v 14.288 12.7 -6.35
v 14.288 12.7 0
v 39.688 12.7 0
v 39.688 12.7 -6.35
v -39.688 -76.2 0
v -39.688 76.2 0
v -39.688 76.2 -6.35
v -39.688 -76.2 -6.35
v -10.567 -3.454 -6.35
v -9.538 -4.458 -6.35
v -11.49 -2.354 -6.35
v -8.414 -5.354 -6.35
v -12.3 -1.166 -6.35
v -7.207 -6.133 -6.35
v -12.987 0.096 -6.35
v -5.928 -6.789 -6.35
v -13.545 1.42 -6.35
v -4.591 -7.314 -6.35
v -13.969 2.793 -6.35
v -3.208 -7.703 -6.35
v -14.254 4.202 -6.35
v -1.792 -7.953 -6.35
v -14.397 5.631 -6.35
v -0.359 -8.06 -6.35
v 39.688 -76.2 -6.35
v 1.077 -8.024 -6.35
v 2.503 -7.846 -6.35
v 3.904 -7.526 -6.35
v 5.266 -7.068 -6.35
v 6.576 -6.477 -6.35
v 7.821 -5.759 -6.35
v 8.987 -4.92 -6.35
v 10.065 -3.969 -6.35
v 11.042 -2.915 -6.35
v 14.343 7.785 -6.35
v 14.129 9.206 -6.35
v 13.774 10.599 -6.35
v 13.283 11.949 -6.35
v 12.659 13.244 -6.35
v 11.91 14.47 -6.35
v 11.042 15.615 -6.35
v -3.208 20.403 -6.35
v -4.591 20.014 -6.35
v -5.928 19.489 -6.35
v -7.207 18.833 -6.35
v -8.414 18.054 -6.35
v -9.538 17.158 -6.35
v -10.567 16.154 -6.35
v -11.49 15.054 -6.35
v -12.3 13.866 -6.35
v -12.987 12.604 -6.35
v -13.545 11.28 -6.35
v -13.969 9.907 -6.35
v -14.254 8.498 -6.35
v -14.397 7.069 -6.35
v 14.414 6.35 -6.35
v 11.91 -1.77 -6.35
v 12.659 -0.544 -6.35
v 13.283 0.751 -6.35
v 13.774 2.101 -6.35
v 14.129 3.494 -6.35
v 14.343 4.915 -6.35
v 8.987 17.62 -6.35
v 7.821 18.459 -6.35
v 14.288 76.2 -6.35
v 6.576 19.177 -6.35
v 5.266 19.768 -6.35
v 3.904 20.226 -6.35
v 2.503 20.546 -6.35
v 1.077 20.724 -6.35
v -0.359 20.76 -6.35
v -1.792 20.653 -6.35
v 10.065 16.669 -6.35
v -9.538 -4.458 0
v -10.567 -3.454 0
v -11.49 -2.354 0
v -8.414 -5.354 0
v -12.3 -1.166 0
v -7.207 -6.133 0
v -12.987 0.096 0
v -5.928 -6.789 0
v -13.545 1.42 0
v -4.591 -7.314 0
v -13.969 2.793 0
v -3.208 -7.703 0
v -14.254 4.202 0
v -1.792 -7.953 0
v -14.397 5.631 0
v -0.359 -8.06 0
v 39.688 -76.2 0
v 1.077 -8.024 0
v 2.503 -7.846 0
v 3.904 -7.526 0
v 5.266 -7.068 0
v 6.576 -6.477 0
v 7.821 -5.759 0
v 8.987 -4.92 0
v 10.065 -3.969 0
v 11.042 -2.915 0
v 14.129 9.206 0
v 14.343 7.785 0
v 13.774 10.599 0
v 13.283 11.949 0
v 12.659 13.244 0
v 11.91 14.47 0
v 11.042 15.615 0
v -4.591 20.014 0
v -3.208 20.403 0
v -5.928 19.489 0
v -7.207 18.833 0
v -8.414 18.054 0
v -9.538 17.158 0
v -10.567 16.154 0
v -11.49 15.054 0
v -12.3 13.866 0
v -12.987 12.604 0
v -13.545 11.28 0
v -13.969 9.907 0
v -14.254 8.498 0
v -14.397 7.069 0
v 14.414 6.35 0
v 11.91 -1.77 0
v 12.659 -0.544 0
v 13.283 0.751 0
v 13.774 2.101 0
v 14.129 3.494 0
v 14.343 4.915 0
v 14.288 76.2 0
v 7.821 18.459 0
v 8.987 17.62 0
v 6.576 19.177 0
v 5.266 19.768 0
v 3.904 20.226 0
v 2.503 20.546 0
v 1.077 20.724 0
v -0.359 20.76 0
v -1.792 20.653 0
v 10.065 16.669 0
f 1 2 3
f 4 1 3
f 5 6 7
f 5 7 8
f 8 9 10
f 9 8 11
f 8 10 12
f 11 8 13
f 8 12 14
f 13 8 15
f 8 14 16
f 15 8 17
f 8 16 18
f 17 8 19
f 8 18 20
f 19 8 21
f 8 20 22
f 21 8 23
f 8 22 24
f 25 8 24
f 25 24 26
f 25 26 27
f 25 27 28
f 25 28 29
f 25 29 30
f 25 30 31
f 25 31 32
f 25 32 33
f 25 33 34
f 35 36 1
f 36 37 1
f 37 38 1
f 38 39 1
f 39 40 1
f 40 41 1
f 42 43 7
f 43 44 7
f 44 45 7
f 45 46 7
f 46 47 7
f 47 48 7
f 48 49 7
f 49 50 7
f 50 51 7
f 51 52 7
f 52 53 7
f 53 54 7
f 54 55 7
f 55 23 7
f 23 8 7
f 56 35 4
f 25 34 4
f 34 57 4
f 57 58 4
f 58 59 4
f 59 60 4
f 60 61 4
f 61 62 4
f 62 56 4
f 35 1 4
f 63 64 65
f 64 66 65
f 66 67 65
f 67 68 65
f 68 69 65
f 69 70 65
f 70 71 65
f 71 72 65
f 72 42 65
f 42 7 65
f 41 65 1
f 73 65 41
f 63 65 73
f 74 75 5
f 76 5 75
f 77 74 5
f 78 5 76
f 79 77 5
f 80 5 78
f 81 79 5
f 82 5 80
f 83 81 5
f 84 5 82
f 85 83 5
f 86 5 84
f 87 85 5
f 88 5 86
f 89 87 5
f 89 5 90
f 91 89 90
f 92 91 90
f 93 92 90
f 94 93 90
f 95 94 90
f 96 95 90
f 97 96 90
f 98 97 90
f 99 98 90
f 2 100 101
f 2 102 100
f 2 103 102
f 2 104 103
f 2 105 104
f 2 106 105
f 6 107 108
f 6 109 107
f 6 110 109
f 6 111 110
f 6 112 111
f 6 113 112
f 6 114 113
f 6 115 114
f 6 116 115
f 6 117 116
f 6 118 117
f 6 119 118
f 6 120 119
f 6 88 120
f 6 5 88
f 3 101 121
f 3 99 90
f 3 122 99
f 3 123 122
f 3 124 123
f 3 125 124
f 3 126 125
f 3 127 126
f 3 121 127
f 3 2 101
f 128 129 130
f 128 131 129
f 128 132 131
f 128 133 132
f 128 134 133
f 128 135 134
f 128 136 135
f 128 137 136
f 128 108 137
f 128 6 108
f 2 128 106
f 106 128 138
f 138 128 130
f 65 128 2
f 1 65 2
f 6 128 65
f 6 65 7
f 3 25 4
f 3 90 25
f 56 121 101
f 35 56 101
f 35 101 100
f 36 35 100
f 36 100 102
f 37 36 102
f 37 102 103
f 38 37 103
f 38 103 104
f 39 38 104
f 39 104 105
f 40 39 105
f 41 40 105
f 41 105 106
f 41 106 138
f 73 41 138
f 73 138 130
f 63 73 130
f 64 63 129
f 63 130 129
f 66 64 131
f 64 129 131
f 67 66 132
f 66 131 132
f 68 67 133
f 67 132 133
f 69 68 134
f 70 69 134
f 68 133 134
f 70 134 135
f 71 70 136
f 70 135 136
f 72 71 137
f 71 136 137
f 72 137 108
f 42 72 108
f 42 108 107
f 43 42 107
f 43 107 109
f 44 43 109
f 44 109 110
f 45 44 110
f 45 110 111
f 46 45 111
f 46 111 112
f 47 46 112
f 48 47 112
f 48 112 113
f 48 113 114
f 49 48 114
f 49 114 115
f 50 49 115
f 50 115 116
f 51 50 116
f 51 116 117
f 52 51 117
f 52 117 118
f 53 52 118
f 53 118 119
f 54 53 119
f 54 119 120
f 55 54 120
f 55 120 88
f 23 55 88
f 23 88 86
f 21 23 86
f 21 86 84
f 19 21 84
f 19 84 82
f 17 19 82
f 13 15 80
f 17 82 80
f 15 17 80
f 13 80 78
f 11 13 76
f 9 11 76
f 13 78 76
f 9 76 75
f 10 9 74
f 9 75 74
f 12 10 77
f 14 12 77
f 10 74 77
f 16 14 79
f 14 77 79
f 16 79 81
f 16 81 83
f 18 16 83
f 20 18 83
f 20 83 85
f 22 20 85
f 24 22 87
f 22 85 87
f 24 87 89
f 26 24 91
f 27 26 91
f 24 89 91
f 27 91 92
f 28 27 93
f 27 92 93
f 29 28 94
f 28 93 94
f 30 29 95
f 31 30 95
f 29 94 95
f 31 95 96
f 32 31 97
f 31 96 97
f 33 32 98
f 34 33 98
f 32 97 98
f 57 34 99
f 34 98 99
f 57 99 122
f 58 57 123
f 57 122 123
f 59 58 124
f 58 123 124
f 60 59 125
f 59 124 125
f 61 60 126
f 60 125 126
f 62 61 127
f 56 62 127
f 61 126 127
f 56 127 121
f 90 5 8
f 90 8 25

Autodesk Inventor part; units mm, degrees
ref_plane "YZ Plane" through (0, 0, 0) normal (1, 0, 0) x (0, 1, 0)
ref_plane "XZ Plane" through (0, 0, 0) normal (0, 1, 0) x (-1, 0, 0)
ref_plane "XY Plane" through (0, 0, 0) normal (0, 0, 1) x (1, 0, 0)
sketch "Sketch1" plane through (0, 0, 0) normal (0, 0, 1) x (1, 0, 0)
  line L0 (-39.6875, -76.2) -> (39.6875, -76.2)
  line L1 (39.6875, -76.2) -> (39.6875, 76.2)
  line L2 (39.6875, 76.2) -> (-39.6875, 76.2)
  line L3 (-39.6875, 76.2) -> (-39.6875, -76.2)
  line L4 (-39.6875, -76.2) -> (39.6875, 76.2) construction
  line L5 (39.6875, -76.2) -> (-39.6875, 76.2) construction
  point P0 (0, 0)
  dimension "d0" = 79.375
  dimension "d1" = 152.4
extrude "Extrusion1" add sketch "Sketch1" against normal blind 6.35
sketch "Sketch2" plane through (0, 0, 0) normal (0, 0, 1) x (1, 0, 0)
  circle A0 centre (0, 6.35) radius 14.4145
  line L0 (39.6875, 76.2) -> (-39.6875, 76.2) projected
  point P0 (0, 0)
  dimension "bearingDiameter" = 28.829
  dimension "d5" = 69.85
extrude "Extrusion2" cut sketch "Sketch2" against normal through all
sketch "Sketch8" plane through (0, 0, 0) normal (0, 0, 1) x (1, 0, 0)
  line L0 (-39.6875, 76.2) -> (39.6875, 76.2) projected
  line L1 (39.6875, 76.2) -> (14.2875, 76.2)
  line L2 (14.2875, 76.2) -> (14.2875, 12.7)
  line L3 (14.2875, 12.7) -> (39.6875, 12.7)
  line L4 (39.6875, 12.7) -> (39.6875, 76.2)
  point P0 (0, 0)
  dimension "d43" = 25.4
  dimension "d44" = 63.5
extrude "Extrusion3" cut sketch "Sketch8" against normal through all
properties part number "plateForHangingMechanism" material "Aluminum 6061"
